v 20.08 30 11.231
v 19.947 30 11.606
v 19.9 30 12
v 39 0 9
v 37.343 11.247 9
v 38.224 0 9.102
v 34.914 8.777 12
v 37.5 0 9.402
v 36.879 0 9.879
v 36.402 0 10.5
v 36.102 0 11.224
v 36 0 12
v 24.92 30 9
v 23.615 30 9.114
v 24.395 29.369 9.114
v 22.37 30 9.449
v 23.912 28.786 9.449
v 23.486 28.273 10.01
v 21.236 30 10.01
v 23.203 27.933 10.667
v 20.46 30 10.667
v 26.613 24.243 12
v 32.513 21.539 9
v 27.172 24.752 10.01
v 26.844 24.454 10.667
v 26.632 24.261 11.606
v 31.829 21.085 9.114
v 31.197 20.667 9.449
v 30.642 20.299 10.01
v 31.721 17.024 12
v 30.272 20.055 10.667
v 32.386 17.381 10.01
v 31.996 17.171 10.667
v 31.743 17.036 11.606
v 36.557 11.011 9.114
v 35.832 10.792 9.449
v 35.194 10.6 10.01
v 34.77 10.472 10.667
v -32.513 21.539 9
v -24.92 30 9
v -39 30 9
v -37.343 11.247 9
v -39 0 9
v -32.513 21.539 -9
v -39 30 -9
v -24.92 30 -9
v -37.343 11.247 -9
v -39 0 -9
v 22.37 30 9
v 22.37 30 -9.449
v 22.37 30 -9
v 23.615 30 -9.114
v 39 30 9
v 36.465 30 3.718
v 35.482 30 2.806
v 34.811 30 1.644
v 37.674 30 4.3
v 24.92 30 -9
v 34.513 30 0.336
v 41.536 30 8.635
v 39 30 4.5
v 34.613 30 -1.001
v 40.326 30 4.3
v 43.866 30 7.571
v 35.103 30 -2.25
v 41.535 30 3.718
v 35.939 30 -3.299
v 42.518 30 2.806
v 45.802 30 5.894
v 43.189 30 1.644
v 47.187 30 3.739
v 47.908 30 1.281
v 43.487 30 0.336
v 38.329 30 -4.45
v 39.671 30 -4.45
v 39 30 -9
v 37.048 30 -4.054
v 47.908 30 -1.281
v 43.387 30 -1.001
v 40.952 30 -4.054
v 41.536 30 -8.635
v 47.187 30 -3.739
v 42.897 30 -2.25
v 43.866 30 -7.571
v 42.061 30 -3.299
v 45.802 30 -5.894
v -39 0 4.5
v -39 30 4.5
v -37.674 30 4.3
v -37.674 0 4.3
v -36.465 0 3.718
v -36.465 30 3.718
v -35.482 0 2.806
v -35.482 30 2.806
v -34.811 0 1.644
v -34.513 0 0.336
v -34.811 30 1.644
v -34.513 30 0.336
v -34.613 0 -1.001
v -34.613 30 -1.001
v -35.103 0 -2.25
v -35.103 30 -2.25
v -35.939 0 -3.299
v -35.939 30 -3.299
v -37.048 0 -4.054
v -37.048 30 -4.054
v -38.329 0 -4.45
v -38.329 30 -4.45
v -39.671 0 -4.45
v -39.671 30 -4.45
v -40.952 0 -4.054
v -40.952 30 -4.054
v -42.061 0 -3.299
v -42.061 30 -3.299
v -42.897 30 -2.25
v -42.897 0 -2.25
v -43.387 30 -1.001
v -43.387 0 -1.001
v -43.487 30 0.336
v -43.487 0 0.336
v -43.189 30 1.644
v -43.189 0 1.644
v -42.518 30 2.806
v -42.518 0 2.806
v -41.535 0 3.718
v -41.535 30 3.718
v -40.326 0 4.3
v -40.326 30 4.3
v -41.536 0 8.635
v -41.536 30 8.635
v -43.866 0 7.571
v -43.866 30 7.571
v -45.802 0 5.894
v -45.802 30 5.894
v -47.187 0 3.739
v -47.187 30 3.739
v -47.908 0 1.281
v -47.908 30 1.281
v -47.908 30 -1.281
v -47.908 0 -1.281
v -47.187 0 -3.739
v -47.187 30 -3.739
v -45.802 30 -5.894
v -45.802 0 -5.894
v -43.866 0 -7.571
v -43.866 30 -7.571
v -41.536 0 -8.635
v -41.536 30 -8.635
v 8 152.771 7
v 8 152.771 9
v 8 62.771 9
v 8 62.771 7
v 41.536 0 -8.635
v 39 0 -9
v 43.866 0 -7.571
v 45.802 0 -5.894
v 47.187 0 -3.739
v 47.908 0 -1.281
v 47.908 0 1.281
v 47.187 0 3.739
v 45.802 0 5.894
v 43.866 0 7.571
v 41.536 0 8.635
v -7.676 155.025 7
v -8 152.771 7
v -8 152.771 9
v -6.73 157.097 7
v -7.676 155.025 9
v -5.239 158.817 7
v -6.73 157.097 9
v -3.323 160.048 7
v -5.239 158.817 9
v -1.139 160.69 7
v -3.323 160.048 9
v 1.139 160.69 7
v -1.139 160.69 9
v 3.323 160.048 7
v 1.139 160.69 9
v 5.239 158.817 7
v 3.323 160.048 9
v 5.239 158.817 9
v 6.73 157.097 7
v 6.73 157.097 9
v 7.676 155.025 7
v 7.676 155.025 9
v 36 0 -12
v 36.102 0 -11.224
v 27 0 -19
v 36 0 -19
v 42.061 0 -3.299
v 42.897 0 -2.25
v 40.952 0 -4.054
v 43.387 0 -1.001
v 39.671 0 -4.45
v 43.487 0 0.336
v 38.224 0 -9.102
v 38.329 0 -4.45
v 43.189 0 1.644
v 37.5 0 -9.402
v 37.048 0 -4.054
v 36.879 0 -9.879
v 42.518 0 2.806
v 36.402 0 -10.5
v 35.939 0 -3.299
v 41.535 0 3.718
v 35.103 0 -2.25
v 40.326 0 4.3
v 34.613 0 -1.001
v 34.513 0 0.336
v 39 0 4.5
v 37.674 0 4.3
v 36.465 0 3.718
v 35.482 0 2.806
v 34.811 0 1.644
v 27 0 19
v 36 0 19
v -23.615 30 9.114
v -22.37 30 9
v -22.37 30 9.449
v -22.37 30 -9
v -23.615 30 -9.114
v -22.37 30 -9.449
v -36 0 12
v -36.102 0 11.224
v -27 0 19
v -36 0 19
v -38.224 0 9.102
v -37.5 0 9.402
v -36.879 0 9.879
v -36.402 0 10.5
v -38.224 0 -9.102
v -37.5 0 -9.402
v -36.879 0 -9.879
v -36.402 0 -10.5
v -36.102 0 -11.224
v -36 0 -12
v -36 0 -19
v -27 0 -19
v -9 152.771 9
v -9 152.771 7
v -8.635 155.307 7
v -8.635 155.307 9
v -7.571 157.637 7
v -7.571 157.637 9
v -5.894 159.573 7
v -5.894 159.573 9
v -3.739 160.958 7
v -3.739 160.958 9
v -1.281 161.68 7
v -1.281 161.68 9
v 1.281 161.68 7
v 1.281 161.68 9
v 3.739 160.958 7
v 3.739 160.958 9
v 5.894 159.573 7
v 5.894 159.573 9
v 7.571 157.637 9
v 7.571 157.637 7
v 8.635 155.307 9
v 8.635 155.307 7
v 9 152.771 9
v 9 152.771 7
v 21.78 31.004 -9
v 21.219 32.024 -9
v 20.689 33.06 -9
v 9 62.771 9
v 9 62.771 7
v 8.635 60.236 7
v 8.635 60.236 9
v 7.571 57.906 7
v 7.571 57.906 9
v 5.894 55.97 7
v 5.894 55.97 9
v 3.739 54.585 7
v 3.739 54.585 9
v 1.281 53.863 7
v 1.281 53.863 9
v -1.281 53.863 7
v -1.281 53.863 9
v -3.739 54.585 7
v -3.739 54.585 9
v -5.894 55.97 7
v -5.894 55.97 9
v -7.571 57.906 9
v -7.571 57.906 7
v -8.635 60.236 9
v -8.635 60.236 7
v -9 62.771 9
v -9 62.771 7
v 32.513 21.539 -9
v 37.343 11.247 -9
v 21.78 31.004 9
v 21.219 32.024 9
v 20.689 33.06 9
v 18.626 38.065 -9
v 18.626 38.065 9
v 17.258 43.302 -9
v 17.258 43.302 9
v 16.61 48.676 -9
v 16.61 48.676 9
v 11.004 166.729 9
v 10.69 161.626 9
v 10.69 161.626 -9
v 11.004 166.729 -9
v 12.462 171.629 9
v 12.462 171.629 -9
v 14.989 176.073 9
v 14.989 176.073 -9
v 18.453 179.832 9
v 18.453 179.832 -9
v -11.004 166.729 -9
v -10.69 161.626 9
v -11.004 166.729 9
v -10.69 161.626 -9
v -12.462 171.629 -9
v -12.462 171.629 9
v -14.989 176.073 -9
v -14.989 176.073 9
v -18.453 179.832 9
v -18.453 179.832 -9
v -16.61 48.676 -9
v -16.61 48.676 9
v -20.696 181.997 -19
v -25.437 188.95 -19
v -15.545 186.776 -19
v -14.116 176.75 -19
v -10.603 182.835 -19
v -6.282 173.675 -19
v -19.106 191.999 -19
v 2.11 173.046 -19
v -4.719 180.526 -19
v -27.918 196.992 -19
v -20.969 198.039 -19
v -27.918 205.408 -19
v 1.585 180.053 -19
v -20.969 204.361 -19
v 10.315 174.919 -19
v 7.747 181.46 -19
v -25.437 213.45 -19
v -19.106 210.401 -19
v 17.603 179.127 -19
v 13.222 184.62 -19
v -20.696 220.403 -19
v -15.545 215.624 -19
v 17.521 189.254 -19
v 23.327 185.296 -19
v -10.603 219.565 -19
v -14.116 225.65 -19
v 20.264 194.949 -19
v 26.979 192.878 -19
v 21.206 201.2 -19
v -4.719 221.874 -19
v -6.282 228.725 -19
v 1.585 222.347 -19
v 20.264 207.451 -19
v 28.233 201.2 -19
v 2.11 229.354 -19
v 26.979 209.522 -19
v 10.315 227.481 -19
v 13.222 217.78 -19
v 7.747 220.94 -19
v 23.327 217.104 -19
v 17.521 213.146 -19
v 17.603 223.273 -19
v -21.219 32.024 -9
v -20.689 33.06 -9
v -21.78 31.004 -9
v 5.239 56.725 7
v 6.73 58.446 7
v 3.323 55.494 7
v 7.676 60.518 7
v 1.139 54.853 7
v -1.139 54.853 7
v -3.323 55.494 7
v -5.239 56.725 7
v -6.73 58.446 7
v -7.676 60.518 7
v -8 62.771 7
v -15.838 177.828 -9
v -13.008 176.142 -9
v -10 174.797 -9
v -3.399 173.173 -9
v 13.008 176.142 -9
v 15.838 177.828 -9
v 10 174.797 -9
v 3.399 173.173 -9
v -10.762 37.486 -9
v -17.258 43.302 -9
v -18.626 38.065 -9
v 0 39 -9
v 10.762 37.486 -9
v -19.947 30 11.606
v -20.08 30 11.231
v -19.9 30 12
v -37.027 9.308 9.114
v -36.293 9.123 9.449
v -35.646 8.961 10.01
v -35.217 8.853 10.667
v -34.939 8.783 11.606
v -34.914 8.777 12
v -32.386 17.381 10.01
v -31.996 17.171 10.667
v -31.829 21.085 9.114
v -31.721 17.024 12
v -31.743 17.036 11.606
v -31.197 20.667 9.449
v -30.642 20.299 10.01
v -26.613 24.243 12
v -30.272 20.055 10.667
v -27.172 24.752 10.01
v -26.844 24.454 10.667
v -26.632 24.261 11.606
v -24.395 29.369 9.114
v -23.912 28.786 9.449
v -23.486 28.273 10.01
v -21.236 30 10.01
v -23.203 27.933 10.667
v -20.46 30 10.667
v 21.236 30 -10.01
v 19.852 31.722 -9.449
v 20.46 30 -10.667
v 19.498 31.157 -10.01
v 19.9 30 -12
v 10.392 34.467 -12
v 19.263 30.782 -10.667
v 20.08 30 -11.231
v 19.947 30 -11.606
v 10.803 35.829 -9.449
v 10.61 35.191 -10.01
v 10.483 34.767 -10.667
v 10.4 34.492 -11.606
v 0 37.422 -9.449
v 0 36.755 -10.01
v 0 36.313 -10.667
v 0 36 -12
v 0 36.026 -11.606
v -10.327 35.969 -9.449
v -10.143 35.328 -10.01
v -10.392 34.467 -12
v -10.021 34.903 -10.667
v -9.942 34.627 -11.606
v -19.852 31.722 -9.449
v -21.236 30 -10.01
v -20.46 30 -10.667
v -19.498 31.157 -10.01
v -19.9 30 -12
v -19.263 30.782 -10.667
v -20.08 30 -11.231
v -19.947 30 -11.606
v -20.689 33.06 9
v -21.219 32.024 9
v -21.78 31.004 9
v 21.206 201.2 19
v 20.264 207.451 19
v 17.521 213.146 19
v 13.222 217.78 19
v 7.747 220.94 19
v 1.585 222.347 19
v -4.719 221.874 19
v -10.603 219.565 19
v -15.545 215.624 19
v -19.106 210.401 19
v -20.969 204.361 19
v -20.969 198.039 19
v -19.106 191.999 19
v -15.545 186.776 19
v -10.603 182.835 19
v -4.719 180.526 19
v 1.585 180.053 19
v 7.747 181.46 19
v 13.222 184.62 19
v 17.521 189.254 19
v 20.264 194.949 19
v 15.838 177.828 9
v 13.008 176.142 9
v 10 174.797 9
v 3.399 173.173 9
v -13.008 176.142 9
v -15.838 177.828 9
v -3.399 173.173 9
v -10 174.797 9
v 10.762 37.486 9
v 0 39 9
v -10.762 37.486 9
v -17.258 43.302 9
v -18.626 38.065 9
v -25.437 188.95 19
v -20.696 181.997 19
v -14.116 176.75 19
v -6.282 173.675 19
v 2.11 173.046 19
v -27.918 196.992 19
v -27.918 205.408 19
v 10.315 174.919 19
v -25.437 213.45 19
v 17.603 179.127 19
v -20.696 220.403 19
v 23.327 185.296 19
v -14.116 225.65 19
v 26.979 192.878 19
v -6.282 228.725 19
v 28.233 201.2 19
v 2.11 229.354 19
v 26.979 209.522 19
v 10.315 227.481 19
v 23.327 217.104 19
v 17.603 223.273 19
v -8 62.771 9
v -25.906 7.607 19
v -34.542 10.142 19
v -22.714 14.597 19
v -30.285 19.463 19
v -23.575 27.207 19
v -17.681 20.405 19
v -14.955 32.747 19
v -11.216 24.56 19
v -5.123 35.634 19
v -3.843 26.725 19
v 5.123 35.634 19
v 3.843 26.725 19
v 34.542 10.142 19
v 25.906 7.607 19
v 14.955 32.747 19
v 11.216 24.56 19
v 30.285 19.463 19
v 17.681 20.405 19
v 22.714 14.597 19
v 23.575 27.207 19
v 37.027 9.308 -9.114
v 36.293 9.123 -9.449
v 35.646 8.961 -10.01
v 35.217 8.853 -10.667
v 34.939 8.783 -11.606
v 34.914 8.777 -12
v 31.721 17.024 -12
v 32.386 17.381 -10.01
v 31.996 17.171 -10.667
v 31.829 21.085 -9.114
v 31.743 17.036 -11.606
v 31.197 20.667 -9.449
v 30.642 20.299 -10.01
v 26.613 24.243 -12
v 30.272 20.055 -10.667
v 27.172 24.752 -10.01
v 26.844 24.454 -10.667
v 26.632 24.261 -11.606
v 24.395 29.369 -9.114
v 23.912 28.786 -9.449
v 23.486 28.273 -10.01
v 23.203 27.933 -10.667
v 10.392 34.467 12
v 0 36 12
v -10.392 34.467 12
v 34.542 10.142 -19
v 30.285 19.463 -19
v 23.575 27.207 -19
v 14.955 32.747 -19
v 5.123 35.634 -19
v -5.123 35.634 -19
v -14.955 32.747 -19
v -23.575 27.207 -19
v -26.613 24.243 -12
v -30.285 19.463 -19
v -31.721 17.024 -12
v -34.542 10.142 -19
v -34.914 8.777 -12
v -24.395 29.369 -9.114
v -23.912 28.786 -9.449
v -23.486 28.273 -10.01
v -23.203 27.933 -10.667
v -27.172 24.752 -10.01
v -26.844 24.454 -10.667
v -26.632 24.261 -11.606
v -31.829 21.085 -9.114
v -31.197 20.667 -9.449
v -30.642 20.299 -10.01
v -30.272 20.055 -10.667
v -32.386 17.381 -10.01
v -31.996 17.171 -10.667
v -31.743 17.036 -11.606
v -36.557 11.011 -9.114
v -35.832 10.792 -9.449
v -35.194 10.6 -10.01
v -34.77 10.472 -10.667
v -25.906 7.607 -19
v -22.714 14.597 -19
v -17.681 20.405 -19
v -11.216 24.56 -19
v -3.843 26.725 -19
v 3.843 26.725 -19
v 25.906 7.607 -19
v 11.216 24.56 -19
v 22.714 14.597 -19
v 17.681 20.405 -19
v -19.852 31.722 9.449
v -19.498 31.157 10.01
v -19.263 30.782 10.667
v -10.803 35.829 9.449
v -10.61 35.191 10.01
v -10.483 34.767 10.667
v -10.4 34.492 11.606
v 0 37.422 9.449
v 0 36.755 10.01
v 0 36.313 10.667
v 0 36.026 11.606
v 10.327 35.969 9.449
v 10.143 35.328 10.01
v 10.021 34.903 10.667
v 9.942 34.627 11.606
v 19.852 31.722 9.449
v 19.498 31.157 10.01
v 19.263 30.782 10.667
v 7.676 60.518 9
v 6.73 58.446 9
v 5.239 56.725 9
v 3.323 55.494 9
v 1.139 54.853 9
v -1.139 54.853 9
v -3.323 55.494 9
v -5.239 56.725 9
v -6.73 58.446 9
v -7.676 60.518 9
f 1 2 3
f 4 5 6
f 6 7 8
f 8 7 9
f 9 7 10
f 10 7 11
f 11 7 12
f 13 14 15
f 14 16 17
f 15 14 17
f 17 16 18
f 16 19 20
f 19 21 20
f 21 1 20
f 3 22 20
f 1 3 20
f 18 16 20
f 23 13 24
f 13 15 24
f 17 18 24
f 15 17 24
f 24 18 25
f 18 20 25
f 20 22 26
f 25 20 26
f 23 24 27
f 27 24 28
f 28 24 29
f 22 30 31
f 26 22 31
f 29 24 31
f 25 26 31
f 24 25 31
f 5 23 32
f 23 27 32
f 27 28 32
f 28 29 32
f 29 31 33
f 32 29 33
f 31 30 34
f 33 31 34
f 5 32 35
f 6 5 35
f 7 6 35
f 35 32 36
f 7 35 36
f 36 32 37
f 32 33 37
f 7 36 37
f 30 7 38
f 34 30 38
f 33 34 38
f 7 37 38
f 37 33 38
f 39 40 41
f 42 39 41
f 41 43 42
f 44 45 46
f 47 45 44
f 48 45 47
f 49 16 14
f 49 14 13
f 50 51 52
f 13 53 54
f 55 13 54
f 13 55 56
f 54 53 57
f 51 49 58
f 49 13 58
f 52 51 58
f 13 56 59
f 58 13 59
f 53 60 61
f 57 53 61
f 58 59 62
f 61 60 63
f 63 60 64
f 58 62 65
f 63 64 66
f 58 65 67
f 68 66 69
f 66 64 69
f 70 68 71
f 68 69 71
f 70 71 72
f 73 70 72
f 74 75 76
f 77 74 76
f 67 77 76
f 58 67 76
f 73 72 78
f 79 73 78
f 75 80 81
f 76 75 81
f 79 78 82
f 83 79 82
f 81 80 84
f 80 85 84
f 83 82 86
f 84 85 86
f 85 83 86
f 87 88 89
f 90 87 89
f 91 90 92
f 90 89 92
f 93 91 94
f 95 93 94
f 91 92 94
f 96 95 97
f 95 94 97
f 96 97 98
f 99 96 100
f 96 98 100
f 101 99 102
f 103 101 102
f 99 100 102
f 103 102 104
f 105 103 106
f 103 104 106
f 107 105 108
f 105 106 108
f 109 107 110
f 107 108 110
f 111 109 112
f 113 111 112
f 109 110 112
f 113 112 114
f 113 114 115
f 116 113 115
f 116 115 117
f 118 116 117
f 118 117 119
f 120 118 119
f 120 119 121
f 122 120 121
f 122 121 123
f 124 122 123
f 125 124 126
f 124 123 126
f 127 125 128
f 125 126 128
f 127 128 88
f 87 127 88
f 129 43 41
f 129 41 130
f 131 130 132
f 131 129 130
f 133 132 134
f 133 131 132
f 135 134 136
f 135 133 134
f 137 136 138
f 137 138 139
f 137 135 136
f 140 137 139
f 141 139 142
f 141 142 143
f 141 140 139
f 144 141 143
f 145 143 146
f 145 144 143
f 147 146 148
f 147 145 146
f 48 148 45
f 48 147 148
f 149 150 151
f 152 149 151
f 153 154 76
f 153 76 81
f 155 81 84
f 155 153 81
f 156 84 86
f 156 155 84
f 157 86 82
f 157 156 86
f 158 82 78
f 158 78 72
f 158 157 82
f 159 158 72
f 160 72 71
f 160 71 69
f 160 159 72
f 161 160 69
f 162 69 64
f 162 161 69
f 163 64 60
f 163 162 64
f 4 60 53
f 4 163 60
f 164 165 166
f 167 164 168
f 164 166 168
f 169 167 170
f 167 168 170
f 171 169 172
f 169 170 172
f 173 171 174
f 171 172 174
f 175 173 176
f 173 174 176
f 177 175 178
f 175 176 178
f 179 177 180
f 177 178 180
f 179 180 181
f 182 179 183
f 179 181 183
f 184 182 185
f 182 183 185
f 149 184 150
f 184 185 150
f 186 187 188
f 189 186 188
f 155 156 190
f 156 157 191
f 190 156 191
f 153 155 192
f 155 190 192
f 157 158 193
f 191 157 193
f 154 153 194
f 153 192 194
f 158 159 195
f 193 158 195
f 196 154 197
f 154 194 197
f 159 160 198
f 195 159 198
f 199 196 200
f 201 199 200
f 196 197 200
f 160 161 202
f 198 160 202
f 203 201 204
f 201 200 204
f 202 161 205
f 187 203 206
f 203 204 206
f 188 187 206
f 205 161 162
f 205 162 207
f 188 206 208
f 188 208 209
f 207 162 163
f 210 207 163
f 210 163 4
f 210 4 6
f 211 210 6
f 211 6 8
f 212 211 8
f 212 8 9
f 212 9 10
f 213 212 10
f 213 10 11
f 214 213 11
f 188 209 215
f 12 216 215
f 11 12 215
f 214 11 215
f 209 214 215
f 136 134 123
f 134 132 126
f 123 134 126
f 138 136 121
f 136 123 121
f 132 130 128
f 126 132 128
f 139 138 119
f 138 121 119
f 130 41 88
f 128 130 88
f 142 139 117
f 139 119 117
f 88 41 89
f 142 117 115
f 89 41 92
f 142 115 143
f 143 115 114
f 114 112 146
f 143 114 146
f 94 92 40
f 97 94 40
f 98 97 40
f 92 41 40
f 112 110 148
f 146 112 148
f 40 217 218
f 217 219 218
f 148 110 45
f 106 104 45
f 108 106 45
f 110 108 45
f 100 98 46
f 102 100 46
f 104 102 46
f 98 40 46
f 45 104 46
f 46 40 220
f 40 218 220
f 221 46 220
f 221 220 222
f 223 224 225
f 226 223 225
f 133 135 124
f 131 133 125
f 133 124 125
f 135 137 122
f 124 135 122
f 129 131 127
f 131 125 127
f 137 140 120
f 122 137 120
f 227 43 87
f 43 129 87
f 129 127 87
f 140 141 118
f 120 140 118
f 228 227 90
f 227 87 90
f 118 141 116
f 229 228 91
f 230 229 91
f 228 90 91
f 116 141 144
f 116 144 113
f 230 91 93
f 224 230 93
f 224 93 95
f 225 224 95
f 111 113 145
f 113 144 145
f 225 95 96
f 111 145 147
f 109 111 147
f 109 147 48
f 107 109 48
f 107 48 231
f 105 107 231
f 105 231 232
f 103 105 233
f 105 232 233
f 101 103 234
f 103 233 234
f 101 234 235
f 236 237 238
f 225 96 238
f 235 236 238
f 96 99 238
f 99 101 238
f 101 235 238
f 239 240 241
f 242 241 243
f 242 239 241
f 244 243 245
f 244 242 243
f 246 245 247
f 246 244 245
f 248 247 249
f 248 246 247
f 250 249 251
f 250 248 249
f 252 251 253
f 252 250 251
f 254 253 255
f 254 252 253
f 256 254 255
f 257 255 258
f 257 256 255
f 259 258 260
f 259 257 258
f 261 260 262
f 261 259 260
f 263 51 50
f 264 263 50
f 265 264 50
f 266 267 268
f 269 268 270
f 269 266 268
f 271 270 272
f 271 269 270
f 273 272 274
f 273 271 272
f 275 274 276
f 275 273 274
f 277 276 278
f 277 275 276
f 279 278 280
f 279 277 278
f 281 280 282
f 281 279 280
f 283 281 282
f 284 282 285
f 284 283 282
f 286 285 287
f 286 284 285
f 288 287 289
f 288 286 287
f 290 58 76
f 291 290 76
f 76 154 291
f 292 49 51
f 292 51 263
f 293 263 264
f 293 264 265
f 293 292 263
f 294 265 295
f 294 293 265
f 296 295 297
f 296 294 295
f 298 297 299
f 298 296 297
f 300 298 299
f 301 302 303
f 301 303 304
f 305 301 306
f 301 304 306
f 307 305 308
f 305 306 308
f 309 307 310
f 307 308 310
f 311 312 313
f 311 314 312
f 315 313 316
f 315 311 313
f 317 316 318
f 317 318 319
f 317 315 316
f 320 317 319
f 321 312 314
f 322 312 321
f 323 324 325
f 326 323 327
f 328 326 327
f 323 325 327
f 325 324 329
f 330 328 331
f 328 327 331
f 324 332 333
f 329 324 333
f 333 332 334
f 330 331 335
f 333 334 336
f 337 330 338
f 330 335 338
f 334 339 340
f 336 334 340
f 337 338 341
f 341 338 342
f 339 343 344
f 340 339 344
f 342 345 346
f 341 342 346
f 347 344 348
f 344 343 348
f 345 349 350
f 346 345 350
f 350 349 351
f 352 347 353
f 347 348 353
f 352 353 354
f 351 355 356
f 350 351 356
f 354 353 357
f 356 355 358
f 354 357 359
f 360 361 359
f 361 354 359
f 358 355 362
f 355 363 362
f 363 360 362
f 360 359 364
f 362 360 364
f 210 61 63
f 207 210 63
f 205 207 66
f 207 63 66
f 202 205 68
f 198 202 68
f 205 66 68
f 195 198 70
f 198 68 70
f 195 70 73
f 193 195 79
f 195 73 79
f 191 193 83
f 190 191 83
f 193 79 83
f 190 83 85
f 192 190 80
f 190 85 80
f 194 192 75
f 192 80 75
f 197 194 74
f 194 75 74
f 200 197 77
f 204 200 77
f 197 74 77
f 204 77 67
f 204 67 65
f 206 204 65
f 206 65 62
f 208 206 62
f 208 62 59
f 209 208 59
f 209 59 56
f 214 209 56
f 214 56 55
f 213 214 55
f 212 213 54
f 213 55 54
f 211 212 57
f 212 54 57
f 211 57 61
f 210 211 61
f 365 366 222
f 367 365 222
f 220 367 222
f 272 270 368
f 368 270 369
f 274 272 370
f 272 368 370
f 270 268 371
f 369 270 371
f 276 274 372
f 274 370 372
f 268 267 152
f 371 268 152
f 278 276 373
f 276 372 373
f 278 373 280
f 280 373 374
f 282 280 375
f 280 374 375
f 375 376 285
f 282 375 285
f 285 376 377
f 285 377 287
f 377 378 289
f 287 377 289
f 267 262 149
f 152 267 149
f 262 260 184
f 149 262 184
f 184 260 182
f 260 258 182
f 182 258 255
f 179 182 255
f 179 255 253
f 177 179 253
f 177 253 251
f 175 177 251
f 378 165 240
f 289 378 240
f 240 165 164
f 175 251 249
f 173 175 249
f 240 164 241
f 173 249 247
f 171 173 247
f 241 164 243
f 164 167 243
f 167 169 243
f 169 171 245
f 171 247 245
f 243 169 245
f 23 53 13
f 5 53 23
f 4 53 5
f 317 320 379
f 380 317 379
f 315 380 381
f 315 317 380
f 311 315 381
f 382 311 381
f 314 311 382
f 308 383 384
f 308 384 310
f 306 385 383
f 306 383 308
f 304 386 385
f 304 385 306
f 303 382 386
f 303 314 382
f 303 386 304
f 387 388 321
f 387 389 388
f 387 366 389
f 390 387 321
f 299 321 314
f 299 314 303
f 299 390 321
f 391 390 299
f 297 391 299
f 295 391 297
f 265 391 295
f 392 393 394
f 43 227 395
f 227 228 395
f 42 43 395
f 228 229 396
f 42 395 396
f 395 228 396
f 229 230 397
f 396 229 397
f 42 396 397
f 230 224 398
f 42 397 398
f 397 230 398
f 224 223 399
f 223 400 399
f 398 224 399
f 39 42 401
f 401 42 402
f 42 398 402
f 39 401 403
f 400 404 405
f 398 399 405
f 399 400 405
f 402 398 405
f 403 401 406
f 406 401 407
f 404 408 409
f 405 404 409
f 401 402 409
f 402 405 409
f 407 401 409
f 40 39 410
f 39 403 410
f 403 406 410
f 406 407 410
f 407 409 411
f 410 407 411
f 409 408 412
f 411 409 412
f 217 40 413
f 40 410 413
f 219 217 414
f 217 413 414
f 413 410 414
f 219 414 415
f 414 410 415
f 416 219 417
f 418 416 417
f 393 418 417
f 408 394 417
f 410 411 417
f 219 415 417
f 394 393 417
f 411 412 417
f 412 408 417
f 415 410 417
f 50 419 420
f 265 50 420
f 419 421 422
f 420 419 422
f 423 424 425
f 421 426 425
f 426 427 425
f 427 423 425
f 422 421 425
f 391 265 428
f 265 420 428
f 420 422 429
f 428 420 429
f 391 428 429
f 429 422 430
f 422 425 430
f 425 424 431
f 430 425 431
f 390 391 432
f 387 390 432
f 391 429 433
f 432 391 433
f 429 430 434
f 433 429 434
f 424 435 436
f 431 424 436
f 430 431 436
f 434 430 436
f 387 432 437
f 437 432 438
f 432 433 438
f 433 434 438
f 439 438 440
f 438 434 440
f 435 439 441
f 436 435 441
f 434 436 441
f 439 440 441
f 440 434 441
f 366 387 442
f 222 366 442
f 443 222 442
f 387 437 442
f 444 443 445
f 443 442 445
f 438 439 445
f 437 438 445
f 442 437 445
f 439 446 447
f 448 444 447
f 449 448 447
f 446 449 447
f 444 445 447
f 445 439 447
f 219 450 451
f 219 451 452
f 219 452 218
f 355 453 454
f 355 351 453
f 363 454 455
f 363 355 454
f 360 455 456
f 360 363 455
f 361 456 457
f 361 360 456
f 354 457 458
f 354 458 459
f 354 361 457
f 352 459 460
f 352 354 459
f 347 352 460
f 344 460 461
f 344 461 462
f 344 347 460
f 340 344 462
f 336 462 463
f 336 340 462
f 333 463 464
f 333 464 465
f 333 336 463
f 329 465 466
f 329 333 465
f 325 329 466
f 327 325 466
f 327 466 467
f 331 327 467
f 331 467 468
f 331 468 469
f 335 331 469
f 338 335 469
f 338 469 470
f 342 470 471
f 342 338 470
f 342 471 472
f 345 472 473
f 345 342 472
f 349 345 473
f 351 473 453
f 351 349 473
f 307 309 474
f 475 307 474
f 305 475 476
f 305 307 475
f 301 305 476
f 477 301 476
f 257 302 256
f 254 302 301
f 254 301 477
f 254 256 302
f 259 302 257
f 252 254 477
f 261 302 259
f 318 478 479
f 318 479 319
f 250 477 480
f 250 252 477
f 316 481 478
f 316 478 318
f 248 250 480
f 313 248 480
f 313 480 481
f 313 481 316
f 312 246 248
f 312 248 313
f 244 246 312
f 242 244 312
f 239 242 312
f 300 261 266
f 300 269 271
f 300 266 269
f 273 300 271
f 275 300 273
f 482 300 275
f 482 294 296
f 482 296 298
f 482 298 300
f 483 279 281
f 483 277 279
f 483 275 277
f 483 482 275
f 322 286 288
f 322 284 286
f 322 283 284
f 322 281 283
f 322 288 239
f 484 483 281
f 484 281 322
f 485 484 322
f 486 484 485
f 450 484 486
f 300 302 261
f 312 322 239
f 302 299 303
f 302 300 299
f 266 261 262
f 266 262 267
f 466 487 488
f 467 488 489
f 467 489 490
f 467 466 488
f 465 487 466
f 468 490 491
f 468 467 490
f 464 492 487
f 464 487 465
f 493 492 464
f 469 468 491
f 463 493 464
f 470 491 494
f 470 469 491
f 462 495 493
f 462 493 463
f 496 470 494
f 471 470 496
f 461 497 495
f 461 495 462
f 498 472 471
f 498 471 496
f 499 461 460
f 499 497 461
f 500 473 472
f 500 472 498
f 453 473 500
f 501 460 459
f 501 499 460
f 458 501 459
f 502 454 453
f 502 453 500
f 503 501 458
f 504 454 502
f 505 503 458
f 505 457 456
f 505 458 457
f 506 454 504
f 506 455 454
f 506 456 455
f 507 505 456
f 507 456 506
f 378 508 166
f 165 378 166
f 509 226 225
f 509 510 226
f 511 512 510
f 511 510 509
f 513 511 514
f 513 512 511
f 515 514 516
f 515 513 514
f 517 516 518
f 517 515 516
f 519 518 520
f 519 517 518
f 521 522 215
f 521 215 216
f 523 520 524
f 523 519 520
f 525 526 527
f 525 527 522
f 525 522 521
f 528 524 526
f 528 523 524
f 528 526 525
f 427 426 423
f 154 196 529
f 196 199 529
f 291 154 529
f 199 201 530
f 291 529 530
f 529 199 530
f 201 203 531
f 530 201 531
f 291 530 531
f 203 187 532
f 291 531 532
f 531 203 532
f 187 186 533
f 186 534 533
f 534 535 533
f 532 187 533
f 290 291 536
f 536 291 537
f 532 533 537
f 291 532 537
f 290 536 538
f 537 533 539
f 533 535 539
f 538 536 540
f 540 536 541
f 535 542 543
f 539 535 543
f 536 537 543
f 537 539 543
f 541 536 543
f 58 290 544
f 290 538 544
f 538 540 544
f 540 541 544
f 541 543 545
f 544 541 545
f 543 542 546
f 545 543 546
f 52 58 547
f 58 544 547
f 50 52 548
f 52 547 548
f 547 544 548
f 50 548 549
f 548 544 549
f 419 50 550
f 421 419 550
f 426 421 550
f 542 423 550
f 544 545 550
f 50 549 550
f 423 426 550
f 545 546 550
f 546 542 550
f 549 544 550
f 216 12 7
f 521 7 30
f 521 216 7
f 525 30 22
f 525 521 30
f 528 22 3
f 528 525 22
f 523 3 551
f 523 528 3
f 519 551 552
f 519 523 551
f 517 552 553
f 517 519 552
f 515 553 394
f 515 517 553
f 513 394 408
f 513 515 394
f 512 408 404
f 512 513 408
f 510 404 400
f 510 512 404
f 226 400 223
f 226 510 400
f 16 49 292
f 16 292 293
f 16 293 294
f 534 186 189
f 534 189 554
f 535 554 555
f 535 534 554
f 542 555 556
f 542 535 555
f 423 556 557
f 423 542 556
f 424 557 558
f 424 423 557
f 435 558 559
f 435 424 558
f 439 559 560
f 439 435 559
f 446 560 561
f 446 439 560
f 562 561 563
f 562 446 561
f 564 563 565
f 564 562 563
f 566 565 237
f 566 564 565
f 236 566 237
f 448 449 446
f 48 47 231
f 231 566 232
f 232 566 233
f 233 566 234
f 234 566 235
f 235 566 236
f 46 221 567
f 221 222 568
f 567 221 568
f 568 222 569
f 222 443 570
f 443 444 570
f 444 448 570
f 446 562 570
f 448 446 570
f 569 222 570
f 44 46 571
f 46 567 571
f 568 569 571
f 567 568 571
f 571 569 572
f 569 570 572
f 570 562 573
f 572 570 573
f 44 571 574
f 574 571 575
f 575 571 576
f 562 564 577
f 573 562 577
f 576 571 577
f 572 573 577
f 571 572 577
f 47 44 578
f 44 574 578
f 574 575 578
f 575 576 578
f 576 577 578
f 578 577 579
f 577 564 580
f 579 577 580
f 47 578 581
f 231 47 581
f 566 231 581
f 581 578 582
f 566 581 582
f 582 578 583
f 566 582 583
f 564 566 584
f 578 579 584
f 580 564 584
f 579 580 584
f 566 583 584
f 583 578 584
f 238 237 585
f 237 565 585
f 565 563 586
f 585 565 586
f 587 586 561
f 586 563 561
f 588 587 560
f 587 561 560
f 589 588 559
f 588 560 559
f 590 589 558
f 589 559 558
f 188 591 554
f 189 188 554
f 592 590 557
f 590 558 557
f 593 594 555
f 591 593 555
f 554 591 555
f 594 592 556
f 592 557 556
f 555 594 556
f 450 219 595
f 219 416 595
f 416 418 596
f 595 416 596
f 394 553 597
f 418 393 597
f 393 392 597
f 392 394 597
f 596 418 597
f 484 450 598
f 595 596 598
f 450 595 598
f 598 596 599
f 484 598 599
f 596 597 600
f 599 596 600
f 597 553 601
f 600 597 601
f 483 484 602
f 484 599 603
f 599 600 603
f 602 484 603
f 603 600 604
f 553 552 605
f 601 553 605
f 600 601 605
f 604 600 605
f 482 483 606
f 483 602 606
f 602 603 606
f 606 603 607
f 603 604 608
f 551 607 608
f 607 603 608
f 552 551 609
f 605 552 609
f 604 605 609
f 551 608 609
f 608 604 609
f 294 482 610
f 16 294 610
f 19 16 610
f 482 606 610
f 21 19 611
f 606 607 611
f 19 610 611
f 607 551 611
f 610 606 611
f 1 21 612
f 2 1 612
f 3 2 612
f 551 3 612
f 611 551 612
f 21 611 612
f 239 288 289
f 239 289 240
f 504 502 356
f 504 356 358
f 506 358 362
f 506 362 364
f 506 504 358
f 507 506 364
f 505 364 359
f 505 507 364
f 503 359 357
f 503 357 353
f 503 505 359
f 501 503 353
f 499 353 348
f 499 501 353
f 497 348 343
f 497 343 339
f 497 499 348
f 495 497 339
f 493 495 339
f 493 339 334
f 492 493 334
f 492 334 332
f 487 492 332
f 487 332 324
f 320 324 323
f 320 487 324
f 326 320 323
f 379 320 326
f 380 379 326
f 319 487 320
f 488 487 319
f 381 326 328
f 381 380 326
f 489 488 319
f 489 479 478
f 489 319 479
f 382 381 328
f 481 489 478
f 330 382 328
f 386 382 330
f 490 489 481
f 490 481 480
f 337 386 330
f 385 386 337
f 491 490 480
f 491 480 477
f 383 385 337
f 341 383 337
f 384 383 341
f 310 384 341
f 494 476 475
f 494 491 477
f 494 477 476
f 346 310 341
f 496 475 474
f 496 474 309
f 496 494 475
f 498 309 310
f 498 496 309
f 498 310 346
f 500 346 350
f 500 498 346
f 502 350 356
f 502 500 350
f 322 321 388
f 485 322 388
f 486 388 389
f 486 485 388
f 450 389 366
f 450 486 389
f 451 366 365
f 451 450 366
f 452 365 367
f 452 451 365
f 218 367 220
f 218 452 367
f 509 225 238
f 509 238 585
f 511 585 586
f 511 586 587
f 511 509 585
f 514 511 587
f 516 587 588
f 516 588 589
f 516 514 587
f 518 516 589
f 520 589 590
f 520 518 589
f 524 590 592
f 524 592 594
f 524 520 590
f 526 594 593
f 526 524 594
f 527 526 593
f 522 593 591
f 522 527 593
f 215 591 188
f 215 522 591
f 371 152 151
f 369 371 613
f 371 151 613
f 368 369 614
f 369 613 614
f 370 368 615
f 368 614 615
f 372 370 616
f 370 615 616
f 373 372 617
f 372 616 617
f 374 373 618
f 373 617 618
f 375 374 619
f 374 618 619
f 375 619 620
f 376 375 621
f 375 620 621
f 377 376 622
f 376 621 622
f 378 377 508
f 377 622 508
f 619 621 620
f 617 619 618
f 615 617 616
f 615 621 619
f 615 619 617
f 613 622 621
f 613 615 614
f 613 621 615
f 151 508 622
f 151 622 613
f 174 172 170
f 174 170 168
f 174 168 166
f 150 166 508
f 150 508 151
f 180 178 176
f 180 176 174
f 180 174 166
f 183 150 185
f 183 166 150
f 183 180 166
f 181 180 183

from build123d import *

# Parameters (mm, degrees)
SKETCH1_R               = 28.232840849
SKETCH1_R_2             = 21.20600046
BOSS_EXTRUDE1_DEPTH     = 19
BOSS_EXTRUDE1_2_DEPTH   = 19
BOSS_EXTRUDE2_DEPTH     = 9
FILLET1_R               = 22.5
FILLET2_R               = 40
CUT_EXTRUDE_THIN1_DEPTH = 2
BOSS_EXTRUDE3_DEPTH     = 30
SKETCH5_R               = 4.5
CUT_EXTRUDE1_DEPTH      = 30
CUT_EXTRUDE2_DEPTH      = 30
FILLET3_R               = 3


with BuildPart() as part:
    # Sketch1 → Boss-Extrude1 (new, symmetric)
    with BuildSketch(Plane.XY):
        with Locations((0, 201.2)):
            Circle(SKETCH1_R)
        with Locations((0, 201.2)):
            Circle(SKETCH1_R_2, mode=Mode.SUBTRACT)
    extrude(amount=BOSS_EXTRUDE1_DEPTH, both=True)



with BuildPart() as body_2:
    # Sketch1 → Boss-Extrude1 2 (new, symmetric)
    with BuildSketch(Plane.XY):
        with BuildLine():
            Line((-36, 0), (-27, 0))
            ThreePointArc((-27, 0), (0, 27), (27, 0))
            Line((27, 0), (36, 0))
            ThreePointArc((36, 0), (0, 36), (-36, 0))
        make_face()
    extrude(amount=BOSS_EXTRUDE1_2_DEPTH, both=True)


with BuildPart() as part_1:
    add(part.part)

    add(body_2.part)  # Boss-Extrude2 merges body 2
    # Sketch2 → Boss-Extrude2 (add, symmetric)
    with BuildSketch(Plane.XY):
        with BuildLine():
            Line((-10, 174.797475454), (-17.512343456, 31.453423132))
            ThreePointArc((-17.512343456, 31.453423132), (0, 36), (17.512343456, 31.453423132))
            Line((17.512343456, 31.453423132), (10, 174.797475454))
            ThreePointArc((10, 174.797475454), (0, 172.967159151), (-10, 174.797475454))
        make_face()
    extrude(amount=BOSS_EXTRUDE2_DEPTH, both=True)

    # Fillet1
    fillet1_edges = [part_1.edges().sort_by_distance(p)[0] for p in [
        (10, 174.797475454, 0),
        (-10, 174.797475454, 0),
    ]]
    fillet(fillet1_edges, radius=FILLET1_R)

    # Fillet2
    fillet2_edges = [part_1.edges().sort_by_distance(p)[0] for p in [
        (-17.512343456, 31.453423132, 0),
        (17.512343456, 31.453423132, 0),
    ]]
    fillet(fillet2_edges, radius=FILLET2_R)

    # Sketch3 → Cut-Extrude-Thin1 (cut, symmetric)
    with BuildSketch(Plane.XY.offset(9)):
        with BuildLine():
            Line((-9, 62.771407141), (-9, 152.771407141))
            ThreePointArc((-9, 152.771407141), (0, 161.771407141), (9, 152.771407141))
            Line((9, 152.771407141), (9, 62.771407141))
            ThreePointArc((9, 62.771407141), (0, 53.771407141), (-9, 62.771407141))
        make_face()
        with BuildLine():
            Line((-8, 62.771407141), (-8, 152.771407141))
            ThreePointArc((-8, 152.771407141), (0, 160.771407141), (8, 152.771407141))
            Line((8, 152.771407141), (8, 62.771407141))
            ThreePointArc((8, 62.771407141), (0, 54.771407141), (-8, 62.771407141))
        make_face(mode=Mode.SUBTRACT)
    extrude(amount=CUT_EXTRUDE_THIN1_DEPTH, both=True, mode=Mode.SUBTRACT)

    # Sketch4 → Boss-Extrude3 (add)
    with BuildSketch(Plane(origin=(0, 0, 0), x_dir=(1, 0, 0), z_dir=(0, 1, 0))):
        with BuildLine():
            Line((-39, 9), (39, 9))
            ThreePointArc((39, 9), (48, 0), (39, -9))
            Line((39, -9), (-39, -9))
            ThreePointArc((-39, -9), (-48, 0), (-39, 9))
        make_face()
    extrude(amount=BOSS_EXTRUDE3_DEPTH)

    # Sketch5 → Cut-Extrude1 (cut)
    with BuildSketch(Plane(origin=(0, 30, 0), x_dir=(1, 0, 0), z_dir=(0, 1, 0))):
        with Locations(Location((-39, 0, 0), (0, 0, 270))):
            Circle(SKETCH5_R)
        with Locations(Location((39, 0, 0), (0, 0, 270))):
            Circle(SKETCH5_R)
    extrude(amount=-CUT_EXTRUDE1_DEPTH, mode=Mode.SUBTRACT)

    # Sketch7 → Cut-Extrude2 (cut)
    with BuildSketch(Plane.XY.offset(9)):
        with BuildLine():
            Line((-27, 0), (27, 0))
            ThreePointArc((27, 0), (0, 27), (-27, 0))
        make_face()
    extrude(amount=-CUT_EXTRUDE2_DEPTH, mode=Mode.SUBTRACT)

    # Fillet3
    # the kernel refuses this fillet: 3 mm, written as the material it adds along each edge
    with BuildSketch(Plane(origin=(0, 0, -9), x_dir=(1, 0, 0), z_dir=(0, -1, 0))) as fillet3_piece_1_section:
        with BuildLine():
            CenterArc((36 + FILLET3_R, -FILLET3_R), FILLET3_R, 90, 90)
            Line((36 + FILLET3_R, 0), (36, 0))
            Line((36, 0), (36, -FILLET3_R))
        make_face()
    fillet3_piece_1 = revolve(axis=Axis((0, 0, -9), (0, 0, 1)), revolution_arc=180, mode=Mode.PRIVATE)
    fillet3_piece_1 = split(fillet3_piece_1, bisect_by=Plane(origin=(34.368782616, 30, -9.69889031), z_dir=(0, -1, 0)), keep=Keep.TOP, mode=Mode.PRIVATE)
    add(fillet3_piece_1)
    with BuildSketch(Plane(origin=(0, 0, -9), x_dir=(1, 0, 0), z_dir=(0, -1, 0))) as fillet3_piece_2_section:
        with BuildLine():
            CenterArc((36 + FILLET3_R, -FILLET3_R), FILLET3_R, 90, 90)
            Line((36 + FILLET3_R, 0), (36, 0))
            Line((36, 0), (36, -FILLET3_R))
        make_face()
    fillet3_piece_2 = revolve(axis=Axis((0, 0, -9), (0, 0, 1)), revolution_arc=180, mode=Mode.PRIVATE)
    fillet3_piece_2 = fillet3_piece_2 - Plane(origin=(-56.554925494, 50.769482983, -9.84745497), x_dir=(0.9986295347545739, -0.05233595624294397, 0), z_dir=(0, 0, -1)) * Cylinder(40, 156, mode=Mode.PRIVATE)
    fillet3_piece_2 = fillet3_piece_2 - Plane(origin=(56.554925494, 50.769482983, -9.84745497), x_dir=(-0.9986295347545739, -0.05233595624294397, 0), z_dir=(0, 0, -1)) * Cylinder(40, 156, mode=Mode.PRIVATE)
    add(fillet3_piece_2)
    with BuildSketch(Plane(origin=(0, 0, 9), x_dir=(-1, 0, 0), z_dir=(0, -1, 0))) as fillet3_piece_3_section:
        with BuildLine():
            CenterArc((36 + FILLET3_R, -FILLET3_R), FILLET3_R, 90, 90)
            Line((36, -FILLET3_R), (36, 0))
            Line((36, 0), (36 + FILLET3_R, 0))
        make_face()
    fillet3_piece_3 = revolve(axis=Axis((0, 0, 9), (0, 0, -1)), revolution_arc=180, mode=Mode.PRIVATE)
    fillet3_piece_3 = split(fillet3_piece_3, bisect_by=Plane(origin=(-34.368785519, 30, 9.698889588), z_dir=(0, -1, 0)), keep=Keep.TOP, mode=Mode.PRIVATE)
    add(fillet3_piece_3)
    with BuildSketch(Plane(origin=(0, 0, 9), x_dir=(-1, 0, 0), z_dir=(0, -1, 0))) as fillet3_piece_4_section:
        with BuildLine():
            CenterArc((36 + FILLET3_R, -FILLET3_R), FILLET3_R, 90, 90)
            Line((36, -FILLET3_R), (36, 0))
            Line((36, 0), (36 + FILLET3_R, 0))
        make_face()
    fillet3_piece_4 = revolve(axis=Axis((0, 0, 9), (0, 0, -1)), revolution_arc=180, mode=Mode.PRIVATE)
    fillet3_piece_4 = fillet3_piece_4 - Plane(origin=(-56.554925494, 50.769482983, 10.5000003), x_dir=(0.9986295347545739, -0.05233595624294397, 0), z_dir=(0, 0, -1)) * Cylinder(40, 156, mode=Mode.PRIVATE)
    fillet3_piece_4 = fillet3_piece_4 - Plane(origin=(56.554925494, 50.769482983, 10.5000003), x_dir=(-0.9986295347545739, -0.05233595624294397, 0), z_dir=(0, 0, -1)) * Cylinder(40, 156, mode=Mode.PRIVATE)
    add(fillet3_piece_4)


solid = part_1.part
